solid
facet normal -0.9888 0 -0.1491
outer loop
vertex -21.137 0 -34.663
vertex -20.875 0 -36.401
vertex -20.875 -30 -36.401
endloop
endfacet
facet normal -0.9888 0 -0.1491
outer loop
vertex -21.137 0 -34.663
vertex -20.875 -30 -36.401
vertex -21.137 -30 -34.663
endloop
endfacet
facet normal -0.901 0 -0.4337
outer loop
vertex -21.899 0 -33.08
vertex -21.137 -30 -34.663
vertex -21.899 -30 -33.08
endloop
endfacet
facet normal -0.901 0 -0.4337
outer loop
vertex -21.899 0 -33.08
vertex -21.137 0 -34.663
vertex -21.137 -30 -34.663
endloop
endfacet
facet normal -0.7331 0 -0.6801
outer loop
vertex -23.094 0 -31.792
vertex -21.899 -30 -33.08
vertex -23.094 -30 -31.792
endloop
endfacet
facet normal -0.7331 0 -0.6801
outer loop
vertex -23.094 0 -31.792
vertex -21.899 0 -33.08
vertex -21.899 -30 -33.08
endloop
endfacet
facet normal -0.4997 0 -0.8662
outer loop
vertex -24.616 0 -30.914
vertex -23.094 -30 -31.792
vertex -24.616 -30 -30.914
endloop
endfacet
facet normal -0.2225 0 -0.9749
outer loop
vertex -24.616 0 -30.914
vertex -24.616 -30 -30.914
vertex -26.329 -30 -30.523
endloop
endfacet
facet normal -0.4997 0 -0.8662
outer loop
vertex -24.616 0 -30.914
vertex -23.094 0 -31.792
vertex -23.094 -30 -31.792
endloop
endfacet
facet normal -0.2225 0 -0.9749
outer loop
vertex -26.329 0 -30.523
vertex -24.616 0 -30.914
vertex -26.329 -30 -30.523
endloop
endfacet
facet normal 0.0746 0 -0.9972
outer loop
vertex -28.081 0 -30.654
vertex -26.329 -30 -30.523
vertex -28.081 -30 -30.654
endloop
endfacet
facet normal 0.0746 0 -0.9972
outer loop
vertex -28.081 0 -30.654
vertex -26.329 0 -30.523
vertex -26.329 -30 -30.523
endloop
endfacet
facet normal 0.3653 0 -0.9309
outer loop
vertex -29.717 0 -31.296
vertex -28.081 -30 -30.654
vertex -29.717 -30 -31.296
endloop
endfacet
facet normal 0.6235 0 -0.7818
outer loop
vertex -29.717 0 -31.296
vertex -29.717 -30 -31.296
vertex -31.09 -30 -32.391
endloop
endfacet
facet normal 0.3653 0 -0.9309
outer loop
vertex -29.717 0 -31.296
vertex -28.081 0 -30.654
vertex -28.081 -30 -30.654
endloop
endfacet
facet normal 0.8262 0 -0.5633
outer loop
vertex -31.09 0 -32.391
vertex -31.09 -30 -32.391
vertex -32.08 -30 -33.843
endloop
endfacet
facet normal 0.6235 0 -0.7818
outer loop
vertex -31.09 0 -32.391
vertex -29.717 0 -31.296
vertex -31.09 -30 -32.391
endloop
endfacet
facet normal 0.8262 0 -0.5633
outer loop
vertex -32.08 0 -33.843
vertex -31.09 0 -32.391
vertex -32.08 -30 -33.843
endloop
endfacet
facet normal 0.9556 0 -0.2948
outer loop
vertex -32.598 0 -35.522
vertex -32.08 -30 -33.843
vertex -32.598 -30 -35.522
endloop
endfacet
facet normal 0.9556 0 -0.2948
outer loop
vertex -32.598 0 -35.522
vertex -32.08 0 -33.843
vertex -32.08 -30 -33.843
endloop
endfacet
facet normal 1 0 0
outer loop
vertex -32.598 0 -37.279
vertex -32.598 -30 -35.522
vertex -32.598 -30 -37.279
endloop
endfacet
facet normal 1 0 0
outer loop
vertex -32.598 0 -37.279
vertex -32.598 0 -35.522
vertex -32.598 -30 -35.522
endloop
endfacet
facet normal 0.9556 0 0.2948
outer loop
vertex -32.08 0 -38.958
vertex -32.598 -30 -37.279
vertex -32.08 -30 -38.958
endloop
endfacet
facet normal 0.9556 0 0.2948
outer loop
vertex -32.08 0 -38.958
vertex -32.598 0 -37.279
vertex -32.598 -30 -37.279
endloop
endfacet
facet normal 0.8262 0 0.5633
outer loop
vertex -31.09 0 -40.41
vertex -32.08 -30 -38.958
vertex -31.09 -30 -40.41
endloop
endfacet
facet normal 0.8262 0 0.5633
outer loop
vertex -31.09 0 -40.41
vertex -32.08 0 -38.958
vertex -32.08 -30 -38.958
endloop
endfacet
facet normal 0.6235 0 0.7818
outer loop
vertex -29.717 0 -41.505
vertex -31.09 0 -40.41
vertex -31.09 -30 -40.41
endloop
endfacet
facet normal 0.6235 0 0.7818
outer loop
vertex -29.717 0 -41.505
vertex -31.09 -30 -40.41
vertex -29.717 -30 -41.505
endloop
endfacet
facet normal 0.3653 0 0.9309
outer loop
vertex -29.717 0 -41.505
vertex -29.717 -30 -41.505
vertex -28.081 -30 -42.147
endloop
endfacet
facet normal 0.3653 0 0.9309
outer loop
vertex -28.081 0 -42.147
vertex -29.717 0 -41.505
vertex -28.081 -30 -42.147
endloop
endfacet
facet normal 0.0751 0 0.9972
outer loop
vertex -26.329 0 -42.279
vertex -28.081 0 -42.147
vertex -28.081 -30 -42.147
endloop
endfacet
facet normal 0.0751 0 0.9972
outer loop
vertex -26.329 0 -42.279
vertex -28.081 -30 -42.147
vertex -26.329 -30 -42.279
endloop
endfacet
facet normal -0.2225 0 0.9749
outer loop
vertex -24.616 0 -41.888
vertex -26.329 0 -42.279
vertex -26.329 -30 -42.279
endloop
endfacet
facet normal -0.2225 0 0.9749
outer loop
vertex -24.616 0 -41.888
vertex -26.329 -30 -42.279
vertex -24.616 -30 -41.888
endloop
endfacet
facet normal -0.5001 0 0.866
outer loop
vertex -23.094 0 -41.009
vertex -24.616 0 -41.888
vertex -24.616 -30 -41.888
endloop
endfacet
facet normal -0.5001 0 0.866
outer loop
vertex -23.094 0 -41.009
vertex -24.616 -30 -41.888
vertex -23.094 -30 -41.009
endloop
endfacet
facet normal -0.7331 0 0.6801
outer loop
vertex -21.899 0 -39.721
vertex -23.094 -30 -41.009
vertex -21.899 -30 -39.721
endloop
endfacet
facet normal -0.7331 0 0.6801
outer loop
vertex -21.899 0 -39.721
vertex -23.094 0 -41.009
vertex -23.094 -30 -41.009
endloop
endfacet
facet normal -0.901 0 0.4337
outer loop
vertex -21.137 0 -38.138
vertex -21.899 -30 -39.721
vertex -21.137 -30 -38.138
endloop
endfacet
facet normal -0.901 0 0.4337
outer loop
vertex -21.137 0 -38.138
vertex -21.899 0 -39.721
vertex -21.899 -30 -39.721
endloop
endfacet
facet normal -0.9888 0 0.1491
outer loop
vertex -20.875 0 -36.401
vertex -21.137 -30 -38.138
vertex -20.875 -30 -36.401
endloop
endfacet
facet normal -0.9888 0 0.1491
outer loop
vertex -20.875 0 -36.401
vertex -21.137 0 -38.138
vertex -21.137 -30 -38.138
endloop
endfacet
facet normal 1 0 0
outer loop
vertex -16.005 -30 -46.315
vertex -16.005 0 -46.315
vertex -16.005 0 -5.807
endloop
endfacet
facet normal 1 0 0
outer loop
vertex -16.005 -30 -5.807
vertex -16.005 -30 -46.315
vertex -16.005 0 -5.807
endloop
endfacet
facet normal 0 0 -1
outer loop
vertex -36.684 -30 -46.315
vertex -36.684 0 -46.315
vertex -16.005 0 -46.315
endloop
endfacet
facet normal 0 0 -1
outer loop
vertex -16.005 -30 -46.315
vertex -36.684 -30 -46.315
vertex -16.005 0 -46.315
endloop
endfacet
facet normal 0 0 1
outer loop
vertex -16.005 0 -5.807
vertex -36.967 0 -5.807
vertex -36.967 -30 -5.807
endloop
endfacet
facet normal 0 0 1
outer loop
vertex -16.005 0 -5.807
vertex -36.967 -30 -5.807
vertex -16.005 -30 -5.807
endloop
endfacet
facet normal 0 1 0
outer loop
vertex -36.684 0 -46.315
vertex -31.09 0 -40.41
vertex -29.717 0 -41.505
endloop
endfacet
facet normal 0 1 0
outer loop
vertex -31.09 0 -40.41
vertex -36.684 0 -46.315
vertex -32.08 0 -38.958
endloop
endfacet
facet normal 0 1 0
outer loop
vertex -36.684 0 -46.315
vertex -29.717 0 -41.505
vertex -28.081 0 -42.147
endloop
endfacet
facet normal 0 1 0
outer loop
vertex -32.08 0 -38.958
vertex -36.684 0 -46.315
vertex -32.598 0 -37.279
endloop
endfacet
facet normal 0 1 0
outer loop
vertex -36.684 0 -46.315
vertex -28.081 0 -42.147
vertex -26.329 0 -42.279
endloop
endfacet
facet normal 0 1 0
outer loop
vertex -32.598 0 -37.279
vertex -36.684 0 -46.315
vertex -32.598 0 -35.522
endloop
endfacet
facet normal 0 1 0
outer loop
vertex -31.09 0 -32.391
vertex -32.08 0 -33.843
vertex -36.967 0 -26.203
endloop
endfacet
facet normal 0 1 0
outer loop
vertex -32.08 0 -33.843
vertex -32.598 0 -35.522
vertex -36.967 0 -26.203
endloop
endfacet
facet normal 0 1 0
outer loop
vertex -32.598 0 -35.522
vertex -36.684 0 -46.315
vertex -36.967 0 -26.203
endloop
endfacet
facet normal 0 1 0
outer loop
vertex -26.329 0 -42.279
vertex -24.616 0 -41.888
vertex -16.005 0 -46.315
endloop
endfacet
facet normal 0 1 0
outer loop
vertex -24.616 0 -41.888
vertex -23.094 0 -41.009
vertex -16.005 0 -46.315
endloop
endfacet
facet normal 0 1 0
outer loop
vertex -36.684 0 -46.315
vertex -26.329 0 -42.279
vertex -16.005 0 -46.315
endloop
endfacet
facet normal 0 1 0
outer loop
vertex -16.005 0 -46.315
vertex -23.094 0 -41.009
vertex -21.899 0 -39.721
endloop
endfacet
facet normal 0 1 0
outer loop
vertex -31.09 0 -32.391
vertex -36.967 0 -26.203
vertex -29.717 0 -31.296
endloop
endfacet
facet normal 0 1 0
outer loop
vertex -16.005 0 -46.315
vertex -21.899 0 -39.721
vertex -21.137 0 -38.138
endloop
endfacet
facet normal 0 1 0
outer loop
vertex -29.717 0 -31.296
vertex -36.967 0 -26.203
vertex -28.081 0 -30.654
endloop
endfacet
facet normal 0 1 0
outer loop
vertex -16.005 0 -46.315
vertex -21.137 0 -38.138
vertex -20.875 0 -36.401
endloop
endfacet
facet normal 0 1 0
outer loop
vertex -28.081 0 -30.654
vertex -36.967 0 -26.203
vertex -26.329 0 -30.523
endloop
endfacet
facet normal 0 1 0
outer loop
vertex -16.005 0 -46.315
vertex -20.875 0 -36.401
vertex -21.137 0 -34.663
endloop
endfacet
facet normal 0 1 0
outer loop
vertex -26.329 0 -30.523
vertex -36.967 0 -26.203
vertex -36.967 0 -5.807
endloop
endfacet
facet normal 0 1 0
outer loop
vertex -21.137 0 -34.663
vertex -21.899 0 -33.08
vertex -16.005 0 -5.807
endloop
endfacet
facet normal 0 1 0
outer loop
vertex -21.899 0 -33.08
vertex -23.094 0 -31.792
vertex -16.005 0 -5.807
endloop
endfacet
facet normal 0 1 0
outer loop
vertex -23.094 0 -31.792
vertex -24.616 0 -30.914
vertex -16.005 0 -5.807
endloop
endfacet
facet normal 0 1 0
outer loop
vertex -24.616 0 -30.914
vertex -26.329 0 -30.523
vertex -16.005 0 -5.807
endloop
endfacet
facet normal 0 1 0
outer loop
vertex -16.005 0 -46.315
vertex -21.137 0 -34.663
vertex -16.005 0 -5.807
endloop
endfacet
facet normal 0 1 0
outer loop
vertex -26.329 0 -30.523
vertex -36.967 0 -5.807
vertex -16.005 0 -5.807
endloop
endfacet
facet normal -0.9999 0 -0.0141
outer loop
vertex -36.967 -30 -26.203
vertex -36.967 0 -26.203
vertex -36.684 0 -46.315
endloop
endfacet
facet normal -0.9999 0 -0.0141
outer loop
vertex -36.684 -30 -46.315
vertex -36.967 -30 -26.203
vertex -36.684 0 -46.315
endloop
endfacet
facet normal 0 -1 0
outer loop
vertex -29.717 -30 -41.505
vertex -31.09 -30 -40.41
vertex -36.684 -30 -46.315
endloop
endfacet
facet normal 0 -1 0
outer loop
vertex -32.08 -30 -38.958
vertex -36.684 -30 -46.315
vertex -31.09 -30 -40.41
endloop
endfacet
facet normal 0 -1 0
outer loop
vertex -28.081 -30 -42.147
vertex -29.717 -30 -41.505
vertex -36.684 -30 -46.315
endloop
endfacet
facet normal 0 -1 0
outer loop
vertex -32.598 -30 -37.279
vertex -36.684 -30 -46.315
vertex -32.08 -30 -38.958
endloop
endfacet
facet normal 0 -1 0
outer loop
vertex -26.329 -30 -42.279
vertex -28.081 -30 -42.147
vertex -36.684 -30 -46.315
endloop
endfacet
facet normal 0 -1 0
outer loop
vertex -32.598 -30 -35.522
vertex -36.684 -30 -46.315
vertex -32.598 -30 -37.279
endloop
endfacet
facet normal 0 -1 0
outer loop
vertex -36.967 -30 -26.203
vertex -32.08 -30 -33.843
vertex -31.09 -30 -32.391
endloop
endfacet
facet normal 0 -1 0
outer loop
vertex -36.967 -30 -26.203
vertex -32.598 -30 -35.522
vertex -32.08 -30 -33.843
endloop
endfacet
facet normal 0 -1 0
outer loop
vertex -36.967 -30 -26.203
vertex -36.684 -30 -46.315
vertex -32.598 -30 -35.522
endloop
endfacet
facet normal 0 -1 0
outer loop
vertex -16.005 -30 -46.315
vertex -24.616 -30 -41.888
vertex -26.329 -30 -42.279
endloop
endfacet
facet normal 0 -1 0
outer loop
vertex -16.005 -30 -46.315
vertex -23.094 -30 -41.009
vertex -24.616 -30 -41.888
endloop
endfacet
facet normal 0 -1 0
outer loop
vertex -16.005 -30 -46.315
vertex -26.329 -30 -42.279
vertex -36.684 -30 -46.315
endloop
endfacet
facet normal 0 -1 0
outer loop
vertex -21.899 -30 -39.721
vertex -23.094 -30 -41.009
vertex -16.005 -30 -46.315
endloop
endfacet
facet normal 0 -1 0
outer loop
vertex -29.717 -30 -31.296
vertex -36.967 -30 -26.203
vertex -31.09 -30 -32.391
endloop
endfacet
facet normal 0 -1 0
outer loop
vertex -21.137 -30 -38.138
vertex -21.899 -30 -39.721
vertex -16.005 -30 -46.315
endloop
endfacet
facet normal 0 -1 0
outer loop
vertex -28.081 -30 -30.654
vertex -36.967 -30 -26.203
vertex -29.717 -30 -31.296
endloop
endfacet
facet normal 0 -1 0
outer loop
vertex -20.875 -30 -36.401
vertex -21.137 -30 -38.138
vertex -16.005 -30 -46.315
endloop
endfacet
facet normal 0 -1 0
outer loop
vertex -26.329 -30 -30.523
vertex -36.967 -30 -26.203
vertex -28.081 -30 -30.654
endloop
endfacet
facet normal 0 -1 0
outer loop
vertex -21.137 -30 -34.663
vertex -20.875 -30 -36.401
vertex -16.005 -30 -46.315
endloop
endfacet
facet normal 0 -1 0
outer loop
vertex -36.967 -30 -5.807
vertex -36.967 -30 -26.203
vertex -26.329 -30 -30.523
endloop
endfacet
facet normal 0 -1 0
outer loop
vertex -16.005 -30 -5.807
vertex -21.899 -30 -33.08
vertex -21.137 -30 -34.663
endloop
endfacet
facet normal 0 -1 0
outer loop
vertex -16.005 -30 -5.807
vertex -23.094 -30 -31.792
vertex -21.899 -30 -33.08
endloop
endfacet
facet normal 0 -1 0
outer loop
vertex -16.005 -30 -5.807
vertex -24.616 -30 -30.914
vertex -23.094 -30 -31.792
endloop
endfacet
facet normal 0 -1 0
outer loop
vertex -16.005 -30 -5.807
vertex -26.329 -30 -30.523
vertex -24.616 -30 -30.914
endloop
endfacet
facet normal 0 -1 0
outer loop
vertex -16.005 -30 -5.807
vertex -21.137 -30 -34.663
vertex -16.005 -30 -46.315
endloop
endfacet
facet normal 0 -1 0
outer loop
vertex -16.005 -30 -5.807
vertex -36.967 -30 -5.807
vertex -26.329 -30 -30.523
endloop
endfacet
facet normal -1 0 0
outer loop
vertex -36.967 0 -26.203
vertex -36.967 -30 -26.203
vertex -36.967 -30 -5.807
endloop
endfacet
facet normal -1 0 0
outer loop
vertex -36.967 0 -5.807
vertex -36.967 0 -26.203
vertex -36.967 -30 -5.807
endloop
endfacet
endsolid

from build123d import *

# Parameters (mm, degrees)
F0_R     = 5.8945377359
F0_W     = 20.9622308612
F0_H     = 20.3956845216
F1_DEPTH = 30


with BuildPart() as f1:
    # F0 (on Front) → F1 (new body)
    with BuildSketch(Plane.XZ):
        Polygon((-36.967176944, -26.2027885765), (-36.6839058697, -46.3152006269), (-16.0049460828, -46.3152006269), (-16.0049460828, -26.2027885765), align=None)
        with Locations((-26.769336313, -36.4006310701)):
            Circle(F0_R, mode=Mode.SUBTRACT)
        with Locations((-26.4860615134, -16.0049463157)):
            Rectangle(F0_W, F0_H)
    extrude(amount=F1_DEPTH)


solid = f1.part
